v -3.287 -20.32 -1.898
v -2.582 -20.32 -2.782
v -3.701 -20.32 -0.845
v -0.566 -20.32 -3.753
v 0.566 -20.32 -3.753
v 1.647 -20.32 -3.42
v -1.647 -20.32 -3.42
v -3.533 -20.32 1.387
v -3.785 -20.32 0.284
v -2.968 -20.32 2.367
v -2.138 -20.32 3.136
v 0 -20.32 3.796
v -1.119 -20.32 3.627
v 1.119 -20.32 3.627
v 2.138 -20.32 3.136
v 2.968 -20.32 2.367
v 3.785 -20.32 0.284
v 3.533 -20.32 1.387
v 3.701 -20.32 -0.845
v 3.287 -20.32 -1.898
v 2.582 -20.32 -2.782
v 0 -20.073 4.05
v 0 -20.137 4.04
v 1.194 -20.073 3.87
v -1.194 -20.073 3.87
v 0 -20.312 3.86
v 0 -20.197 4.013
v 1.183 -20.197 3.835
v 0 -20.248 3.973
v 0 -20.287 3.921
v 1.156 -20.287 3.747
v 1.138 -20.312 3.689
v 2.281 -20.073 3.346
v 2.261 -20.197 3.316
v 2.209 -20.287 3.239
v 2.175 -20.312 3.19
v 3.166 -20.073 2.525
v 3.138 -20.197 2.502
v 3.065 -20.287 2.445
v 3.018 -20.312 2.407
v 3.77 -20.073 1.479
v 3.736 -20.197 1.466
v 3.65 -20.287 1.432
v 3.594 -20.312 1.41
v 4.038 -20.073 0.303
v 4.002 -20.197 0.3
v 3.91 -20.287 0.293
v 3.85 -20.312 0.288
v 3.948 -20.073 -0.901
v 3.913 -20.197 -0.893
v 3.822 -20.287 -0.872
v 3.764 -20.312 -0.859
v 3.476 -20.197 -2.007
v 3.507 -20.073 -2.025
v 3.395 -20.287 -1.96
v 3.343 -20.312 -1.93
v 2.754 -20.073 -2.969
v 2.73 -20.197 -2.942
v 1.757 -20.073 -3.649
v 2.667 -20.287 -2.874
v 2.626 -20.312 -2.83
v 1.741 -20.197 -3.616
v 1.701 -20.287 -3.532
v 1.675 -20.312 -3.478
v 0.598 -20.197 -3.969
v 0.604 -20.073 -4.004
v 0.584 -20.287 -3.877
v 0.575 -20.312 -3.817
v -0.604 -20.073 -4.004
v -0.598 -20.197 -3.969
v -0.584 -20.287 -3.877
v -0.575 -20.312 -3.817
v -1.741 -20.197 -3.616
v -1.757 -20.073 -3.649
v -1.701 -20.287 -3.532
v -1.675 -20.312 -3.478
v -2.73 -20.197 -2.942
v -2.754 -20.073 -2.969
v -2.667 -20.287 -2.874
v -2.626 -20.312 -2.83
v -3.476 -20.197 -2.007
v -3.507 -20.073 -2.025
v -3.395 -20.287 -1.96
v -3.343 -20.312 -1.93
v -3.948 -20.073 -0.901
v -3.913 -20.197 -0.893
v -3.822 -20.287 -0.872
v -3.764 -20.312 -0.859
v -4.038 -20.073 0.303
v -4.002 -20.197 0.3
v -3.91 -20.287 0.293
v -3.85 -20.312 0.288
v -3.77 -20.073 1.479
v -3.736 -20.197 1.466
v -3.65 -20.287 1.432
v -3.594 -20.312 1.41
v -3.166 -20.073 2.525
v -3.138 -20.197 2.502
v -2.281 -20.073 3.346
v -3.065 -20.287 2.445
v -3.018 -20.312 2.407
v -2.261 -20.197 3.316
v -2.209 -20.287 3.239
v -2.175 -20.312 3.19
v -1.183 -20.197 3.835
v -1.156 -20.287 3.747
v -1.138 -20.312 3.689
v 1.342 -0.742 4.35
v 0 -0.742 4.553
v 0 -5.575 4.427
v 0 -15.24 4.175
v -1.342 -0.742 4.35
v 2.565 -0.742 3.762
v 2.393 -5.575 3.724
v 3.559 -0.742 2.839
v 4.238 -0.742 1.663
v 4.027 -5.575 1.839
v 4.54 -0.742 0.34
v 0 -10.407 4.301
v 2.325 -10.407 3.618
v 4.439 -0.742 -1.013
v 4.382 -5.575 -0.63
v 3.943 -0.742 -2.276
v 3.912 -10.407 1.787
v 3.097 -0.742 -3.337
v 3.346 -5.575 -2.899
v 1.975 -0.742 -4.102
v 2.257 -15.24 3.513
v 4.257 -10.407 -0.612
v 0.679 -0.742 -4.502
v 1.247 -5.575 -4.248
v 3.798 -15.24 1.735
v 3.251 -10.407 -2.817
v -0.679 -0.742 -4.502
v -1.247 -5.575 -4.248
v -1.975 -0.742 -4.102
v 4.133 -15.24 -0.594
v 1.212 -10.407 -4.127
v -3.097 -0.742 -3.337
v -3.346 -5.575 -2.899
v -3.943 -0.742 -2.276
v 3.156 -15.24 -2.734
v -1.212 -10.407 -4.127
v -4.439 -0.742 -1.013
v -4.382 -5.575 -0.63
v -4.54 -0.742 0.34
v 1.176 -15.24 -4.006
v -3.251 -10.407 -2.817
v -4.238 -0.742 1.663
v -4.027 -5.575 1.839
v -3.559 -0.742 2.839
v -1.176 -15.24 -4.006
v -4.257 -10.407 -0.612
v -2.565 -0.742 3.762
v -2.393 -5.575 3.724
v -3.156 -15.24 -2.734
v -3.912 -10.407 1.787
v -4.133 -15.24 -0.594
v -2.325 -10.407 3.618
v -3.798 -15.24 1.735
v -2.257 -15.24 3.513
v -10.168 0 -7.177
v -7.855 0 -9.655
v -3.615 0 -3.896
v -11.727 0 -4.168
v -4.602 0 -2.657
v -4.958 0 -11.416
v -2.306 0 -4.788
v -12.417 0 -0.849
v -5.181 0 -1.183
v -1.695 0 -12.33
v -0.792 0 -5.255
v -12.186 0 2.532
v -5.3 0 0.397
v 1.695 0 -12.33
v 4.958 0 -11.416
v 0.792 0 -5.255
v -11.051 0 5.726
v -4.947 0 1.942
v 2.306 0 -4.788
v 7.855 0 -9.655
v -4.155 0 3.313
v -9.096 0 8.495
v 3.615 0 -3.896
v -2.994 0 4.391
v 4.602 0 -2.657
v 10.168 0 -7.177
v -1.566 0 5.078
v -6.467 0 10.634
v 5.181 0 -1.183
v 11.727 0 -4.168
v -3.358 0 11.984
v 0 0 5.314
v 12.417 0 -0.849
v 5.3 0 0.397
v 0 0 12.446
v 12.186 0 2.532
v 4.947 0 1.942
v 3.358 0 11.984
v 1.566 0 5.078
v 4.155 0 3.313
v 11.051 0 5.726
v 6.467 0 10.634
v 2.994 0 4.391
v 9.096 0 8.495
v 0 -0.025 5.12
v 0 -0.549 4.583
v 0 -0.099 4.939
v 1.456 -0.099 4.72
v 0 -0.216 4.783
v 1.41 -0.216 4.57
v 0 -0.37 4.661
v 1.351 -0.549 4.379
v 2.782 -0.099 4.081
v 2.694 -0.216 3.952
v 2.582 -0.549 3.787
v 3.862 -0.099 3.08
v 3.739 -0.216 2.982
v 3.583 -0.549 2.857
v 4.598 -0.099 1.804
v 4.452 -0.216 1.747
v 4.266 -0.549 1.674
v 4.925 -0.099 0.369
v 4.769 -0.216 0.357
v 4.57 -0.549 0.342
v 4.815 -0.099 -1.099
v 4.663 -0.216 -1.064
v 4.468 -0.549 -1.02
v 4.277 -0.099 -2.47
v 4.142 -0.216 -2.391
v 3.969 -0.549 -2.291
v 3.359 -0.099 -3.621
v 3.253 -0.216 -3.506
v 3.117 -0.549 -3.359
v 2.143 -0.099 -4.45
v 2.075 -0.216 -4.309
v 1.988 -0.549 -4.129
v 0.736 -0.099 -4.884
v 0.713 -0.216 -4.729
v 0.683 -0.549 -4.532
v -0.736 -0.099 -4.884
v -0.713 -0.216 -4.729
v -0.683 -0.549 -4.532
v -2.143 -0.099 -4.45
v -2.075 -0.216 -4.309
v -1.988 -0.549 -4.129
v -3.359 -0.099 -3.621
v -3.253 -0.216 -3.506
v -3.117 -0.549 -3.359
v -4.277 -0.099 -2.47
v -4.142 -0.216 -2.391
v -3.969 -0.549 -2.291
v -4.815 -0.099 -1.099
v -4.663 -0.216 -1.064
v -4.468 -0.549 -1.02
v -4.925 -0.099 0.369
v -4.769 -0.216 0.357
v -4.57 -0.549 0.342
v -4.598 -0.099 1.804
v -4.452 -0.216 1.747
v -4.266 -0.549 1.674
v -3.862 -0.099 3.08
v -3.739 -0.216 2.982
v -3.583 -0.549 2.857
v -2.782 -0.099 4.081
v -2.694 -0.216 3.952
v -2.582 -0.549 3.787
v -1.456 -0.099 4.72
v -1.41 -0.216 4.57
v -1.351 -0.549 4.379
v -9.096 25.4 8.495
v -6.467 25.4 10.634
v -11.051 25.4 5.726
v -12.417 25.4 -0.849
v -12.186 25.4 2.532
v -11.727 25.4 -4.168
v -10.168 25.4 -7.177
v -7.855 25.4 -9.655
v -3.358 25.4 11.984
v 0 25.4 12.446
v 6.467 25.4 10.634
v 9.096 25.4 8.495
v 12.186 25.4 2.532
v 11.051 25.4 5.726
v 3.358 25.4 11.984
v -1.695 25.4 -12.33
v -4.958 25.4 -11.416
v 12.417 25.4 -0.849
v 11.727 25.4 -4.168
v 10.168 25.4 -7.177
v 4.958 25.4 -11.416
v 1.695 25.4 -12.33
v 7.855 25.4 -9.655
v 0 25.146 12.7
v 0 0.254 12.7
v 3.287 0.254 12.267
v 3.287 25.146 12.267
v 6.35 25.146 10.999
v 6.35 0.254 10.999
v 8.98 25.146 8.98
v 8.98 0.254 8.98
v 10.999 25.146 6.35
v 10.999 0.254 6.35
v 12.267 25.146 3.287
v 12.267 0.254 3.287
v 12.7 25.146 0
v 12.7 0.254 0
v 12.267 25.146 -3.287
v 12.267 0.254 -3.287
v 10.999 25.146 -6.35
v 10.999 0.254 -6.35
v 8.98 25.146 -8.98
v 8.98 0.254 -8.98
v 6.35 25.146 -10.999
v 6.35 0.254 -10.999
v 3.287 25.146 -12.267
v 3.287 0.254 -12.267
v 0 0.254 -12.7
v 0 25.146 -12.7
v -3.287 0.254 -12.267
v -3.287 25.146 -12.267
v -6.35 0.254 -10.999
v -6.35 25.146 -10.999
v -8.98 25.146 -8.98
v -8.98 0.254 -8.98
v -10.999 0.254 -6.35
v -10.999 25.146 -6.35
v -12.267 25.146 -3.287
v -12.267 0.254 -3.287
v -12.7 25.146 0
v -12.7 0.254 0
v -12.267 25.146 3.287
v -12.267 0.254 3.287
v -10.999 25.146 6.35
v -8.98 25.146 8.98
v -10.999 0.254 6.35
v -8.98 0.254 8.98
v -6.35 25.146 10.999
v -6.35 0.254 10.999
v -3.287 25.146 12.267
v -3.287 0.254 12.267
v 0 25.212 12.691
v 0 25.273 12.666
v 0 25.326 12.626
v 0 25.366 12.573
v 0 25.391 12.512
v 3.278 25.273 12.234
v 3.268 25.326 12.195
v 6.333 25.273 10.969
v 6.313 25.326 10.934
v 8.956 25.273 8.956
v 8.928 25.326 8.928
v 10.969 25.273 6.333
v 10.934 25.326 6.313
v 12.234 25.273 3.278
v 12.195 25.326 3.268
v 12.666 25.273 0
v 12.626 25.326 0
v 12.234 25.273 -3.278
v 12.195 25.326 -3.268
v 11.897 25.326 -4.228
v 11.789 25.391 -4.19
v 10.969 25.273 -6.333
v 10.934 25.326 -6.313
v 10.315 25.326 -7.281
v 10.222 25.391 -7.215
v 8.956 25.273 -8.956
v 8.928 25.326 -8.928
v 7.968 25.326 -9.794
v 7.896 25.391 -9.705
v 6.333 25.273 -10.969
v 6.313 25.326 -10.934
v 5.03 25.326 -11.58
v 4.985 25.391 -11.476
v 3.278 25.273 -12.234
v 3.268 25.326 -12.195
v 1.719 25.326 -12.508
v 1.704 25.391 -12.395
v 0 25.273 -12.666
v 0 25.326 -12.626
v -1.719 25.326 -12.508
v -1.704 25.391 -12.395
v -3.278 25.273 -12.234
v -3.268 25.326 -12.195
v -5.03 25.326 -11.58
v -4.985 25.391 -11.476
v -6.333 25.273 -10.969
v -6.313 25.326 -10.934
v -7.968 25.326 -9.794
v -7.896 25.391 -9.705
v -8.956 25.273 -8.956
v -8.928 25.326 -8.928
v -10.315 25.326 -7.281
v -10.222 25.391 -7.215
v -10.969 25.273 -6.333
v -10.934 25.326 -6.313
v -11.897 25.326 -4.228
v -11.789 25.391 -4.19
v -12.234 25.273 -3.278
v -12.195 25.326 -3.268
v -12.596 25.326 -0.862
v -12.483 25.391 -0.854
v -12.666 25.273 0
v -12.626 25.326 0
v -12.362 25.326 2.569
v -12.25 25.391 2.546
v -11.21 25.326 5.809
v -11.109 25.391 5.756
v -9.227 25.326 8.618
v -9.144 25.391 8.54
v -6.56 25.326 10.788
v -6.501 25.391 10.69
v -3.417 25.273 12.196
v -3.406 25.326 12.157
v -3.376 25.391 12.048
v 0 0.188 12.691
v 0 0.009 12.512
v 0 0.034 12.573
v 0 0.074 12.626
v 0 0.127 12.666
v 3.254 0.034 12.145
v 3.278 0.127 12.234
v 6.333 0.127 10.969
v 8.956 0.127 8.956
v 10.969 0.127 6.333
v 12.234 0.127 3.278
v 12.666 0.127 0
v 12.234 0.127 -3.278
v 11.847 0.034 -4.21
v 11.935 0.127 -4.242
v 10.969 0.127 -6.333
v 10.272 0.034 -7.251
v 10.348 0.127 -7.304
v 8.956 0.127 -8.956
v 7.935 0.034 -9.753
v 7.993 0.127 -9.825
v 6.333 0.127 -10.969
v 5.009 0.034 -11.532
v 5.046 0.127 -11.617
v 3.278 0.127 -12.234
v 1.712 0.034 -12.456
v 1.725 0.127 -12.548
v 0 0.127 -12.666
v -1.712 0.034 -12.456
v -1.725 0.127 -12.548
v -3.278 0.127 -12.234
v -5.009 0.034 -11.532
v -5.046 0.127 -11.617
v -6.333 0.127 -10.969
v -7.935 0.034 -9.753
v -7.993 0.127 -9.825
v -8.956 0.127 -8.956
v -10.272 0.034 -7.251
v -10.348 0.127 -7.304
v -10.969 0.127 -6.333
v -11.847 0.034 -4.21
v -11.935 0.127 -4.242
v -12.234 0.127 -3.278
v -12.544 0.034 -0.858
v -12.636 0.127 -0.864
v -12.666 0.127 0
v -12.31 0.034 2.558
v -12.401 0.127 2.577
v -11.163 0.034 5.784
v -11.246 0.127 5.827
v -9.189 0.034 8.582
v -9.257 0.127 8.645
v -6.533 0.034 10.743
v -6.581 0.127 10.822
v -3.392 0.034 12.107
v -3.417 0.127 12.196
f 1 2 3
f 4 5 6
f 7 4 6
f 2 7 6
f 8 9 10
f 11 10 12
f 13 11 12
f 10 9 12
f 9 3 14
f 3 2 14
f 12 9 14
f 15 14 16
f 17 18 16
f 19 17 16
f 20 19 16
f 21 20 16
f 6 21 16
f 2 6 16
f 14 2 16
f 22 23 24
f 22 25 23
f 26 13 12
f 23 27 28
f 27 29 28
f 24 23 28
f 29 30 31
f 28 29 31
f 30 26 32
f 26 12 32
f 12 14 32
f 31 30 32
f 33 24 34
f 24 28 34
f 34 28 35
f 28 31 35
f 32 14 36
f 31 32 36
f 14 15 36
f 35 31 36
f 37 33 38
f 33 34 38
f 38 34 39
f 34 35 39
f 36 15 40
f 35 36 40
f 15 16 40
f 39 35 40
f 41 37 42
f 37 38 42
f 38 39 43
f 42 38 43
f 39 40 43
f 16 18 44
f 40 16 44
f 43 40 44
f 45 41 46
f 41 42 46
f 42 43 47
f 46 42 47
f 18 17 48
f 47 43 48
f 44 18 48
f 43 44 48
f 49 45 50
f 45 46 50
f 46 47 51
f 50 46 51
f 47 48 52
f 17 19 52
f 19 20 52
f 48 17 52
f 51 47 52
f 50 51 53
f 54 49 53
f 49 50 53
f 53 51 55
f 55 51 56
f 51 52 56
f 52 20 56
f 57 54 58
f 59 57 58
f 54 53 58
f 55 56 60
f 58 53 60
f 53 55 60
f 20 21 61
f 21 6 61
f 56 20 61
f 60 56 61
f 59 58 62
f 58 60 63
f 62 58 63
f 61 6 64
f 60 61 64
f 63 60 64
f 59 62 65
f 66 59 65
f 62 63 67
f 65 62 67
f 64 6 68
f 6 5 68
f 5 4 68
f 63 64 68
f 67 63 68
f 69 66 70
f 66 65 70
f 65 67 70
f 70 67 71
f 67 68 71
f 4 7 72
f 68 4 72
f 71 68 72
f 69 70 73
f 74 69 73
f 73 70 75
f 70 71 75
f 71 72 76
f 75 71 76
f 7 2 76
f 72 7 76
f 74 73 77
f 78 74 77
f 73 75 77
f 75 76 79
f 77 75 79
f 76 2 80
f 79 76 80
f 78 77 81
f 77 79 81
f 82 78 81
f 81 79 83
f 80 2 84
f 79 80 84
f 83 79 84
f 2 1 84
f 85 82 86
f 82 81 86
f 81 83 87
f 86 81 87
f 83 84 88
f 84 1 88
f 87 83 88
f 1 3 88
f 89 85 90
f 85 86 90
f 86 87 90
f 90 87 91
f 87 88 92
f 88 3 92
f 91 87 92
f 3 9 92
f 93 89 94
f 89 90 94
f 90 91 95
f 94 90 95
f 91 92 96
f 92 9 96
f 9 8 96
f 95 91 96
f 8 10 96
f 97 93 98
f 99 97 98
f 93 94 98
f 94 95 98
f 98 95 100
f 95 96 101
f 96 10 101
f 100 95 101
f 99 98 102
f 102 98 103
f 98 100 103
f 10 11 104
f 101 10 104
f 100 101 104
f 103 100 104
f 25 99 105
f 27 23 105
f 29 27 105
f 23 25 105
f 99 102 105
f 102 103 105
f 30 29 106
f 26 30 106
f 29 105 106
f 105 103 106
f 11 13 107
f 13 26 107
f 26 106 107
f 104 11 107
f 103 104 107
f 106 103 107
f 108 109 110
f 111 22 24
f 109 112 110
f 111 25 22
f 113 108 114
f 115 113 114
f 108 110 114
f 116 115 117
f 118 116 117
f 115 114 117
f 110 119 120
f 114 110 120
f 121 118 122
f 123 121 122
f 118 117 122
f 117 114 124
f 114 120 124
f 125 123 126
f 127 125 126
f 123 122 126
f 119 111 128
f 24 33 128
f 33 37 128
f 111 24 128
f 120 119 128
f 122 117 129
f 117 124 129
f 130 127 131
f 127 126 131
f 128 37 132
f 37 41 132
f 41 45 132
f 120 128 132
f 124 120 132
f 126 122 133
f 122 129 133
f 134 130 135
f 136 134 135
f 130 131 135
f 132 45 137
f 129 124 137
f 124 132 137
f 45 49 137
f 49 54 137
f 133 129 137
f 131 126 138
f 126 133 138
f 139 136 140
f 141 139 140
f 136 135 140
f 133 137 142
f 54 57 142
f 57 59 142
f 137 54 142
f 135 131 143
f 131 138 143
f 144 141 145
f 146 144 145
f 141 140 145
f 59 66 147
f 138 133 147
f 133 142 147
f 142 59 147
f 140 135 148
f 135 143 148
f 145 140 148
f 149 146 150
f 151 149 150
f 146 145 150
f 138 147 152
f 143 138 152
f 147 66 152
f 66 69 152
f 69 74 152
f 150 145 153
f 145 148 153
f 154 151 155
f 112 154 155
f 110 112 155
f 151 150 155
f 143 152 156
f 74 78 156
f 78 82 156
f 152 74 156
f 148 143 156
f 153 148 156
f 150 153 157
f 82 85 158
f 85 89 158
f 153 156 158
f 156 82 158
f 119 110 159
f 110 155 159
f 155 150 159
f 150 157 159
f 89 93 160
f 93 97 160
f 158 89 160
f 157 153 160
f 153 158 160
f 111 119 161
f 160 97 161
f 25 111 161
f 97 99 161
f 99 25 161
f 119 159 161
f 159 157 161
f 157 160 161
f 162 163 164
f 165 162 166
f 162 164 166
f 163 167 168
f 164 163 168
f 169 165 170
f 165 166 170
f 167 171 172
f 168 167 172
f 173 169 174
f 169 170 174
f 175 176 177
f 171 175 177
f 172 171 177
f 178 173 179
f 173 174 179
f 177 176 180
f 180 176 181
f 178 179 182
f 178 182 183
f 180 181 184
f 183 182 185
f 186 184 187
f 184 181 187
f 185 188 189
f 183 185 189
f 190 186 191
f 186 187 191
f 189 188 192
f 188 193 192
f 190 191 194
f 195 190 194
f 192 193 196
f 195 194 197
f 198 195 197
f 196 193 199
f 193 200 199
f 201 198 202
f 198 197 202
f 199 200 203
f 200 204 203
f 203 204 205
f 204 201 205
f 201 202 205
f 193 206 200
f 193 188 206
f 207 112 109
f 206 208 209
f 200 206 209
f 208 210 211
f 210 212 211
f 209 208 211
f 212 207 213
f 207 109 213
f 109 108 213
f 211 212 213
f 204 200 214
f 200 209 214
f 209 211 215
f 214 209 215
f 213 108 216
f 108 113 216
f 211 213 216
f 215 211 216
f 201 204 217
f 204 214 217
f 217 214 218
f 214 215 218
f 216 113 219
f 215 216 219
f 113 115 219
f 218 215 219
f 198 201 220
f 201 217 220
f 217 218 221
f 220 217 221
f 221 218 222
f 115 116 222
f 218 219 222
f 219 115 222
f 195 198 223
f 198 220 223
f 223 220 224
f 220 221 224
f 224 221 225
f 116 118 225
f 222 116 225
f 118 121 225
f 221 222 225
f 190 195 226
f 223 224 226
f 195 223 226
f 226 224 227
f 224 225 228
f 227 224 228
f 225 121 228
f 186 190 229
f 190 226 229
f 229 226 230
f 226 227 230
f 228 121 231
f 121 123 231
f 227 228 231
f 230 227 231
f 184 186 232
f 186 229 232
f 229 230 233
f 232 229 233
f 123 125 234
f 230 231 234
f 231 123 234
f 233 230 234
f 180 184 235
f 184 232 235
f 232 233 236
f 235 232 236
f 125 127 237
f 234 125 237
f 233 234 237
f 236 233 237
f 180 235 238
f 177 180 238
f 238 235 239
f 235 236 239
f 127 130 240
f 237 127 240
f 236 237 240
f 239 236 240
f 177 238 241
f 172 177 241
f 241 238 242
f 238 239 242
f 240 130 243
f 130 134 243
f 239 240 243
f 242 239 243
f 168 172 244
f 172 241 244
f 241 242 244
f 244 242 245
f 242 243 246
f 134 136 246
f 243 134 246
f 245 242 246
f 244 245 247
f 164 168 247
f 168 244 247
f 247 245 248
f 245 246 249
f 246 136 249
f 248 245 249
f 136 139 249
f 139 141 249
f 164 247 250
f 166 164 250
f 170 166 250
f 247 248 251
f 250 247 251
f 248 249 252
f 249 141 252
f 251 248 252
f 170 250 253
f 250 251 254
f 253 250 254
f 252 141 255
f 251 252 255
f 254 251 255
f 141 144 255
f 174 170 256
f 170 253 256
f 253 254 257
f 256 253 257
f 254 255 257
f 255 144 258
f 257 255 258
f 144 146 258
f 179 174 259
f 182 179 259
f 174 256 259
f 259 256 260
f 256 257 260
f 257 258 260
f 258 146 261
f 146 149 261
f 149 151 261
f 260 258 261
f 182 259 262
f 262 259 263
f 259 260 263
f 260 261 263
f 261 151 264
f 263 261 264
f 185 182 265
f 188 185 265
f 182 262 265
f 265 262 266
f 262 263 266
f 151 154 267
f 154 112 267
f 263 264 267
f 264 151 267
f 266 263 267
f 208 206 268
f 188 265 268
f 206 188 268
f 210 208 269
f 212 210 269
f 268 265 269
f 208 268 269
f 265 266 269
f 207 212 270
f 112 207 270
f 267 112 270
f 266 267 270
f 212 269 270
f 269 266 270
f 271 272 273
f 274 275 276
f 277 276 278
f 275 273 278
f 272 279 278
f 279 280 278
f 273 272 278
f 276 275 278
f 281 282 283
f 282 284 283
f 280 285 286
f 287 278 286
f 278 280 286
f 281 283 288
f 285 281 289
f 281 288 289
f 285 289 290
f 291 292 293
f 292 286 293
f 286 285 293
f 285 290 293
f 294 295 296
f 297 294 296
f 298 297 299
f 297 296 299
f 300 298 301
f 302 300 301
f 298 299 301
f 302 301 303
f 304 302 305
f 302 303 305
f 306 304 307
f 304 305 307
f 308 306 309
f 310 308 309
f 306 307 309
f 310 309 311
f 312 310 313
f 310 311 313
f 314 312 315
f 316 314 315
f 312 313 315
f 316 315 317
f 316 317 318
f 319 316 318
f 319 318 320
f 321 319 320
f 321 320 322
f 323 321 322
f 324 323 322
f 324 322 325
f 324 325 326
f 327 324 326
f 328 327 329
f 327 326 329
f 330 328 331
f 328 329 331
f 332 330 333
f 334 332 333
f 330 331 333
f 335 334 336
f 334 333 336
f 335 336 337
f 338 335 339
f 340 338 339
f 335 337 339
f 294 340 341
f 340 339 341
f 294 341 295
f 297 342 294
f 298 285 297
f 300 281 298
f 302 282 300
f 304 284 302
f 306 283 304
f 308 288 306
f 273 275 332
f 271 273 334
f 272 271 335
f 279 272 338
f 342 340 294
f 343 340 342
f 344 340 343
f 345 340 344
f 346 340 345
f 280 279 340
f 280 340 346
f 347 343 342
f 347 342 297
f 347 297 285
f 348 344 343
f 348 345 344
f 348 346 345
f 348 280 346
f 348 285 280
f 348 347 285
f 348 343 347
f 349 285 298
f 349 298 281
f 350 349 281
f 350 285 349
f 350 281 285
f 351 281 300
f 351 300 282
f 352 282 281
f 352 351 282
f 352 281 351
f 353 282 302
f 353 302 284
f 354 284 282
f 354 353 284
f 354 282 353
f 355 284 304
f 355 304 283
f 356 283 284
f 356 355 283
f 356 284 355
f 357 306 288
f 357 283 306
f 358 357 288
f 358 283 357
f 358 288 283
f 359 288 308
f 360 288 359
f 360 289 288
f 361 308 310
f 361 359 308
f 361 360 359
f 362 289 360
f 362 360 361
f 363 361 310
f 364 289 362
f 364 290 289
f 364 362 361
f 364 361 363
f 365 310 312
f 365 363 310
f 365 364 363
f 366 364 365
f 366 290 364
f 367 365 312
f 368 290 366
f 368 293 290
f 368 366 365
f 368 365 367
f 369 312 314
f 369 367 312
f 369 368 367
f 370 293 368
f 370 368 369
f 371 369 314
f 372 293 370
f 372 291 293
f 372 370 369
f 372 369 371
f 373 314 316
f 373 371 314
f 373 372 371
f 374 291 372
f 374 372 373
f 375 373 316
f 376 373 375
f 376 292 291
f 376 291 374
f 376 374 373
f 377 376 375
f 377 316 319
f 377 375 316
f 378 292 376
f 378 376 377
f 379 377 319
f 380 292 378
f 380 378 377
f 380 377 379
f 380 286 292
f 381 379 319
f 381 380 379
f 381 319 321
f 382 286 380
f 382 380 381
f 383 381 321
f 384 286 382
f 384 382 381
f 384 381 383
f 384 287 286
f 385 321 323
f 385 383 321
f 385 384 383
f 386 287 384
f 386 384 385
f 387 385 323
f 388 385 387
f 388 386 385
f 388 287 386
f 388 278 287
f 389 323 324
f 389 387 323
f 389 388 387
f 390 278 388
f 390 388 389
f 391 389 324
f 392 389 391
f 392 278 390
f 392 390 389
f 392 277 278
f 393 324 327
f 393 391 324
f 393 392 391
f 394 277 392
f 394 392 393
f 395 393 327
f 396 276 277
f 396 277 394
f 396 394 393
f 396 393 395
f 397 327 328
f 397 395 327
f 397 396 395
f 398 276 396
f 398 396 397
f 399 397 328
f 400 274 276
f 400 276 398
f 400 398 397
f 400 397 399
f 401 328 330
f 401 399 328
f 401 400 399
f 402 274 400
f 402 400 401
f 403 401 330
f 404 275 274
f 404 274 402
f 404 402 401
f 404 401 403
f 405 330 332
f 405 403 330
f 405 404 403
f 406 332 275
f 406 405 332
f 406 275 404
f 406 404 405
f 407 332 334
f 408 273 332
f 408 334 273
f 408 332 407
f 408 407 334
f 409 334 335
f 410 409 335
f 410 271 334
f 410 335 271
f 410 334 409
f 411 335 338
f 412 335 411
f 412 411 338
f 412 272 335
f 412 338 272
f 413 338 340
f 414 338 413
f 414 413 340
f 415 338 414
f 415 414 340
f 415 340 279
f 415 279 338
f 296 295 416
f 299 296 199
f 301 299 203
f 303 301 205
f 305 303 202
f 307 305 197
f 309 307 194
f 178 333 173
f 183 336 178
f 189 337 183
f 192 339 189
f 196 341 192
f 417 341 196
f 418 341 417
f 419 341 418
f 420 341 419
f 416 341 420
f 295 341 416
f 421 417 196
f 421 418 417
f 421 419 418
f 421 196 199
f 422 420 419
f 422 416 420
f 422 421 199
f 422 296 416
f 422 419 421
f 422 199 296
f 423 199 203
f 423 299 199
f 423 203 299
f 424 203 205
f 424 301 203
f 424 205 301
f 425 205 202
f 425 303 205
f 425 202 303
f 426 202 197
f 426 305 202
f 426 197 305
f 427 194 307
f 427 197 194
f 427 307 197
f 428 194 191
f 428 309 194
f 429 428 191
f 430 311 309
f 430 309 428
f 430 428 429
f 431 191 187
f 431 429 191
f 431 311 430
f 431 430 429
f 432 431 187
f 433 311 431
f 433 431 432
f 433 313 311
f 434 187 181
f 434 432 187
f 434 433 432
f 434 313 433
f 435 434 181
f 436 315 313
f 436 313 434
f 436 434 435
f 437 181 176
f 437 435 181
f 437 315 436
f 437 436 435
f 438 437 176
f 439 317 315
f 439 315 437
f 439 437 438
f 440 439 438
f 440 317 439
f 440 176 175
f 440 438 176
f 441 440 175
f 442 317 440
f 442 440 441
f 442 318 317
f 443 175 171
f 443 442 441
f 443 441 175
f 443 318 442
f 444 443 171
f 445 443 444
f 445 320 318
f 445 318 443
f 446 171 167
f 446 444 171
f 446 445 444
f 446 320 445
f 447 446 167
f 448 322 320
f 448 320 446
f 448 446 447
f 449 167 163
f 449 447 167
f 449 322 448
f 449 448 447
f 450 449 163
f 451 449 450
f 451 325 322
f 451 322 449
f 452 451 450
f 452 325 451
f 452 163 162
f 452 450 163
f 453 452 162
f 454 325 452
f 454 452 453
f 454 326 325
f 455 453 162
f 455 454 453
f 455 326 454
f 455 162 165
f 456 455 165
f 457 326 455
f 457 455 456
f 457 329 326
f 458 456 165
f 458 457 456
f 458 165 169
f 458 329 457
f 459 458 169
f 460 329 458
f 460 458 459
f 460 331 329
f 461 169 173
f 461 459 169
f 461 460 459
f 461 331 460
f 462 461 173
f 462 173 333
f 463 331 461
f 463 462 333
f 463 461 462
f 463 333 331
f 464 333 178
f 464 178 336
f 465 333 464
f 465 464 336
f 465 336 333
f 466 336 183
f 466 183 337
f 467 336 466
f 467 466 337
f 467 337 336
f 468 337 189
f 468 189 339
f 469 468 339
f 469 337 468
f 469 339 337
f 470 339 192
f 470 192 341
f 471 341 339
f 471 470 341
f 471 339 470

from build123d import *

# Parameters (mm, degrees)
F2_R = 0.762
F3_R = 0.254


with BuildPart() as f1:
    # F0 (on Right) → F1 (revolve)
    with BuildSketch(Plane.YZ):
        Polygon((-20.32, 0), (25.4, 0), (25.4, 12.7), (0, 12.7), (0, 4.572), (-20.32, 4.043167), align=None)
    revolve(axis=Axis((0, 2.54, 0), (0, 1, 0)))

    # F2
    f2_edges = [f1.edges().sort_by_distance(p)[0] for p in [
        (0, 0, -4.572),
    ]]
    fillet(f2_edges, radius=F2_R)

    # F3
    f3_edges = [f1.edges().sort_by_distance(p)[0] for p in [
        (0, 0, -12.7),
        (0, 25.4, -12.7),
        (0, -20.32, -4.043167),
    ]]
    fillet(f3_edges, radius=F3_R)


solid = f1.part
